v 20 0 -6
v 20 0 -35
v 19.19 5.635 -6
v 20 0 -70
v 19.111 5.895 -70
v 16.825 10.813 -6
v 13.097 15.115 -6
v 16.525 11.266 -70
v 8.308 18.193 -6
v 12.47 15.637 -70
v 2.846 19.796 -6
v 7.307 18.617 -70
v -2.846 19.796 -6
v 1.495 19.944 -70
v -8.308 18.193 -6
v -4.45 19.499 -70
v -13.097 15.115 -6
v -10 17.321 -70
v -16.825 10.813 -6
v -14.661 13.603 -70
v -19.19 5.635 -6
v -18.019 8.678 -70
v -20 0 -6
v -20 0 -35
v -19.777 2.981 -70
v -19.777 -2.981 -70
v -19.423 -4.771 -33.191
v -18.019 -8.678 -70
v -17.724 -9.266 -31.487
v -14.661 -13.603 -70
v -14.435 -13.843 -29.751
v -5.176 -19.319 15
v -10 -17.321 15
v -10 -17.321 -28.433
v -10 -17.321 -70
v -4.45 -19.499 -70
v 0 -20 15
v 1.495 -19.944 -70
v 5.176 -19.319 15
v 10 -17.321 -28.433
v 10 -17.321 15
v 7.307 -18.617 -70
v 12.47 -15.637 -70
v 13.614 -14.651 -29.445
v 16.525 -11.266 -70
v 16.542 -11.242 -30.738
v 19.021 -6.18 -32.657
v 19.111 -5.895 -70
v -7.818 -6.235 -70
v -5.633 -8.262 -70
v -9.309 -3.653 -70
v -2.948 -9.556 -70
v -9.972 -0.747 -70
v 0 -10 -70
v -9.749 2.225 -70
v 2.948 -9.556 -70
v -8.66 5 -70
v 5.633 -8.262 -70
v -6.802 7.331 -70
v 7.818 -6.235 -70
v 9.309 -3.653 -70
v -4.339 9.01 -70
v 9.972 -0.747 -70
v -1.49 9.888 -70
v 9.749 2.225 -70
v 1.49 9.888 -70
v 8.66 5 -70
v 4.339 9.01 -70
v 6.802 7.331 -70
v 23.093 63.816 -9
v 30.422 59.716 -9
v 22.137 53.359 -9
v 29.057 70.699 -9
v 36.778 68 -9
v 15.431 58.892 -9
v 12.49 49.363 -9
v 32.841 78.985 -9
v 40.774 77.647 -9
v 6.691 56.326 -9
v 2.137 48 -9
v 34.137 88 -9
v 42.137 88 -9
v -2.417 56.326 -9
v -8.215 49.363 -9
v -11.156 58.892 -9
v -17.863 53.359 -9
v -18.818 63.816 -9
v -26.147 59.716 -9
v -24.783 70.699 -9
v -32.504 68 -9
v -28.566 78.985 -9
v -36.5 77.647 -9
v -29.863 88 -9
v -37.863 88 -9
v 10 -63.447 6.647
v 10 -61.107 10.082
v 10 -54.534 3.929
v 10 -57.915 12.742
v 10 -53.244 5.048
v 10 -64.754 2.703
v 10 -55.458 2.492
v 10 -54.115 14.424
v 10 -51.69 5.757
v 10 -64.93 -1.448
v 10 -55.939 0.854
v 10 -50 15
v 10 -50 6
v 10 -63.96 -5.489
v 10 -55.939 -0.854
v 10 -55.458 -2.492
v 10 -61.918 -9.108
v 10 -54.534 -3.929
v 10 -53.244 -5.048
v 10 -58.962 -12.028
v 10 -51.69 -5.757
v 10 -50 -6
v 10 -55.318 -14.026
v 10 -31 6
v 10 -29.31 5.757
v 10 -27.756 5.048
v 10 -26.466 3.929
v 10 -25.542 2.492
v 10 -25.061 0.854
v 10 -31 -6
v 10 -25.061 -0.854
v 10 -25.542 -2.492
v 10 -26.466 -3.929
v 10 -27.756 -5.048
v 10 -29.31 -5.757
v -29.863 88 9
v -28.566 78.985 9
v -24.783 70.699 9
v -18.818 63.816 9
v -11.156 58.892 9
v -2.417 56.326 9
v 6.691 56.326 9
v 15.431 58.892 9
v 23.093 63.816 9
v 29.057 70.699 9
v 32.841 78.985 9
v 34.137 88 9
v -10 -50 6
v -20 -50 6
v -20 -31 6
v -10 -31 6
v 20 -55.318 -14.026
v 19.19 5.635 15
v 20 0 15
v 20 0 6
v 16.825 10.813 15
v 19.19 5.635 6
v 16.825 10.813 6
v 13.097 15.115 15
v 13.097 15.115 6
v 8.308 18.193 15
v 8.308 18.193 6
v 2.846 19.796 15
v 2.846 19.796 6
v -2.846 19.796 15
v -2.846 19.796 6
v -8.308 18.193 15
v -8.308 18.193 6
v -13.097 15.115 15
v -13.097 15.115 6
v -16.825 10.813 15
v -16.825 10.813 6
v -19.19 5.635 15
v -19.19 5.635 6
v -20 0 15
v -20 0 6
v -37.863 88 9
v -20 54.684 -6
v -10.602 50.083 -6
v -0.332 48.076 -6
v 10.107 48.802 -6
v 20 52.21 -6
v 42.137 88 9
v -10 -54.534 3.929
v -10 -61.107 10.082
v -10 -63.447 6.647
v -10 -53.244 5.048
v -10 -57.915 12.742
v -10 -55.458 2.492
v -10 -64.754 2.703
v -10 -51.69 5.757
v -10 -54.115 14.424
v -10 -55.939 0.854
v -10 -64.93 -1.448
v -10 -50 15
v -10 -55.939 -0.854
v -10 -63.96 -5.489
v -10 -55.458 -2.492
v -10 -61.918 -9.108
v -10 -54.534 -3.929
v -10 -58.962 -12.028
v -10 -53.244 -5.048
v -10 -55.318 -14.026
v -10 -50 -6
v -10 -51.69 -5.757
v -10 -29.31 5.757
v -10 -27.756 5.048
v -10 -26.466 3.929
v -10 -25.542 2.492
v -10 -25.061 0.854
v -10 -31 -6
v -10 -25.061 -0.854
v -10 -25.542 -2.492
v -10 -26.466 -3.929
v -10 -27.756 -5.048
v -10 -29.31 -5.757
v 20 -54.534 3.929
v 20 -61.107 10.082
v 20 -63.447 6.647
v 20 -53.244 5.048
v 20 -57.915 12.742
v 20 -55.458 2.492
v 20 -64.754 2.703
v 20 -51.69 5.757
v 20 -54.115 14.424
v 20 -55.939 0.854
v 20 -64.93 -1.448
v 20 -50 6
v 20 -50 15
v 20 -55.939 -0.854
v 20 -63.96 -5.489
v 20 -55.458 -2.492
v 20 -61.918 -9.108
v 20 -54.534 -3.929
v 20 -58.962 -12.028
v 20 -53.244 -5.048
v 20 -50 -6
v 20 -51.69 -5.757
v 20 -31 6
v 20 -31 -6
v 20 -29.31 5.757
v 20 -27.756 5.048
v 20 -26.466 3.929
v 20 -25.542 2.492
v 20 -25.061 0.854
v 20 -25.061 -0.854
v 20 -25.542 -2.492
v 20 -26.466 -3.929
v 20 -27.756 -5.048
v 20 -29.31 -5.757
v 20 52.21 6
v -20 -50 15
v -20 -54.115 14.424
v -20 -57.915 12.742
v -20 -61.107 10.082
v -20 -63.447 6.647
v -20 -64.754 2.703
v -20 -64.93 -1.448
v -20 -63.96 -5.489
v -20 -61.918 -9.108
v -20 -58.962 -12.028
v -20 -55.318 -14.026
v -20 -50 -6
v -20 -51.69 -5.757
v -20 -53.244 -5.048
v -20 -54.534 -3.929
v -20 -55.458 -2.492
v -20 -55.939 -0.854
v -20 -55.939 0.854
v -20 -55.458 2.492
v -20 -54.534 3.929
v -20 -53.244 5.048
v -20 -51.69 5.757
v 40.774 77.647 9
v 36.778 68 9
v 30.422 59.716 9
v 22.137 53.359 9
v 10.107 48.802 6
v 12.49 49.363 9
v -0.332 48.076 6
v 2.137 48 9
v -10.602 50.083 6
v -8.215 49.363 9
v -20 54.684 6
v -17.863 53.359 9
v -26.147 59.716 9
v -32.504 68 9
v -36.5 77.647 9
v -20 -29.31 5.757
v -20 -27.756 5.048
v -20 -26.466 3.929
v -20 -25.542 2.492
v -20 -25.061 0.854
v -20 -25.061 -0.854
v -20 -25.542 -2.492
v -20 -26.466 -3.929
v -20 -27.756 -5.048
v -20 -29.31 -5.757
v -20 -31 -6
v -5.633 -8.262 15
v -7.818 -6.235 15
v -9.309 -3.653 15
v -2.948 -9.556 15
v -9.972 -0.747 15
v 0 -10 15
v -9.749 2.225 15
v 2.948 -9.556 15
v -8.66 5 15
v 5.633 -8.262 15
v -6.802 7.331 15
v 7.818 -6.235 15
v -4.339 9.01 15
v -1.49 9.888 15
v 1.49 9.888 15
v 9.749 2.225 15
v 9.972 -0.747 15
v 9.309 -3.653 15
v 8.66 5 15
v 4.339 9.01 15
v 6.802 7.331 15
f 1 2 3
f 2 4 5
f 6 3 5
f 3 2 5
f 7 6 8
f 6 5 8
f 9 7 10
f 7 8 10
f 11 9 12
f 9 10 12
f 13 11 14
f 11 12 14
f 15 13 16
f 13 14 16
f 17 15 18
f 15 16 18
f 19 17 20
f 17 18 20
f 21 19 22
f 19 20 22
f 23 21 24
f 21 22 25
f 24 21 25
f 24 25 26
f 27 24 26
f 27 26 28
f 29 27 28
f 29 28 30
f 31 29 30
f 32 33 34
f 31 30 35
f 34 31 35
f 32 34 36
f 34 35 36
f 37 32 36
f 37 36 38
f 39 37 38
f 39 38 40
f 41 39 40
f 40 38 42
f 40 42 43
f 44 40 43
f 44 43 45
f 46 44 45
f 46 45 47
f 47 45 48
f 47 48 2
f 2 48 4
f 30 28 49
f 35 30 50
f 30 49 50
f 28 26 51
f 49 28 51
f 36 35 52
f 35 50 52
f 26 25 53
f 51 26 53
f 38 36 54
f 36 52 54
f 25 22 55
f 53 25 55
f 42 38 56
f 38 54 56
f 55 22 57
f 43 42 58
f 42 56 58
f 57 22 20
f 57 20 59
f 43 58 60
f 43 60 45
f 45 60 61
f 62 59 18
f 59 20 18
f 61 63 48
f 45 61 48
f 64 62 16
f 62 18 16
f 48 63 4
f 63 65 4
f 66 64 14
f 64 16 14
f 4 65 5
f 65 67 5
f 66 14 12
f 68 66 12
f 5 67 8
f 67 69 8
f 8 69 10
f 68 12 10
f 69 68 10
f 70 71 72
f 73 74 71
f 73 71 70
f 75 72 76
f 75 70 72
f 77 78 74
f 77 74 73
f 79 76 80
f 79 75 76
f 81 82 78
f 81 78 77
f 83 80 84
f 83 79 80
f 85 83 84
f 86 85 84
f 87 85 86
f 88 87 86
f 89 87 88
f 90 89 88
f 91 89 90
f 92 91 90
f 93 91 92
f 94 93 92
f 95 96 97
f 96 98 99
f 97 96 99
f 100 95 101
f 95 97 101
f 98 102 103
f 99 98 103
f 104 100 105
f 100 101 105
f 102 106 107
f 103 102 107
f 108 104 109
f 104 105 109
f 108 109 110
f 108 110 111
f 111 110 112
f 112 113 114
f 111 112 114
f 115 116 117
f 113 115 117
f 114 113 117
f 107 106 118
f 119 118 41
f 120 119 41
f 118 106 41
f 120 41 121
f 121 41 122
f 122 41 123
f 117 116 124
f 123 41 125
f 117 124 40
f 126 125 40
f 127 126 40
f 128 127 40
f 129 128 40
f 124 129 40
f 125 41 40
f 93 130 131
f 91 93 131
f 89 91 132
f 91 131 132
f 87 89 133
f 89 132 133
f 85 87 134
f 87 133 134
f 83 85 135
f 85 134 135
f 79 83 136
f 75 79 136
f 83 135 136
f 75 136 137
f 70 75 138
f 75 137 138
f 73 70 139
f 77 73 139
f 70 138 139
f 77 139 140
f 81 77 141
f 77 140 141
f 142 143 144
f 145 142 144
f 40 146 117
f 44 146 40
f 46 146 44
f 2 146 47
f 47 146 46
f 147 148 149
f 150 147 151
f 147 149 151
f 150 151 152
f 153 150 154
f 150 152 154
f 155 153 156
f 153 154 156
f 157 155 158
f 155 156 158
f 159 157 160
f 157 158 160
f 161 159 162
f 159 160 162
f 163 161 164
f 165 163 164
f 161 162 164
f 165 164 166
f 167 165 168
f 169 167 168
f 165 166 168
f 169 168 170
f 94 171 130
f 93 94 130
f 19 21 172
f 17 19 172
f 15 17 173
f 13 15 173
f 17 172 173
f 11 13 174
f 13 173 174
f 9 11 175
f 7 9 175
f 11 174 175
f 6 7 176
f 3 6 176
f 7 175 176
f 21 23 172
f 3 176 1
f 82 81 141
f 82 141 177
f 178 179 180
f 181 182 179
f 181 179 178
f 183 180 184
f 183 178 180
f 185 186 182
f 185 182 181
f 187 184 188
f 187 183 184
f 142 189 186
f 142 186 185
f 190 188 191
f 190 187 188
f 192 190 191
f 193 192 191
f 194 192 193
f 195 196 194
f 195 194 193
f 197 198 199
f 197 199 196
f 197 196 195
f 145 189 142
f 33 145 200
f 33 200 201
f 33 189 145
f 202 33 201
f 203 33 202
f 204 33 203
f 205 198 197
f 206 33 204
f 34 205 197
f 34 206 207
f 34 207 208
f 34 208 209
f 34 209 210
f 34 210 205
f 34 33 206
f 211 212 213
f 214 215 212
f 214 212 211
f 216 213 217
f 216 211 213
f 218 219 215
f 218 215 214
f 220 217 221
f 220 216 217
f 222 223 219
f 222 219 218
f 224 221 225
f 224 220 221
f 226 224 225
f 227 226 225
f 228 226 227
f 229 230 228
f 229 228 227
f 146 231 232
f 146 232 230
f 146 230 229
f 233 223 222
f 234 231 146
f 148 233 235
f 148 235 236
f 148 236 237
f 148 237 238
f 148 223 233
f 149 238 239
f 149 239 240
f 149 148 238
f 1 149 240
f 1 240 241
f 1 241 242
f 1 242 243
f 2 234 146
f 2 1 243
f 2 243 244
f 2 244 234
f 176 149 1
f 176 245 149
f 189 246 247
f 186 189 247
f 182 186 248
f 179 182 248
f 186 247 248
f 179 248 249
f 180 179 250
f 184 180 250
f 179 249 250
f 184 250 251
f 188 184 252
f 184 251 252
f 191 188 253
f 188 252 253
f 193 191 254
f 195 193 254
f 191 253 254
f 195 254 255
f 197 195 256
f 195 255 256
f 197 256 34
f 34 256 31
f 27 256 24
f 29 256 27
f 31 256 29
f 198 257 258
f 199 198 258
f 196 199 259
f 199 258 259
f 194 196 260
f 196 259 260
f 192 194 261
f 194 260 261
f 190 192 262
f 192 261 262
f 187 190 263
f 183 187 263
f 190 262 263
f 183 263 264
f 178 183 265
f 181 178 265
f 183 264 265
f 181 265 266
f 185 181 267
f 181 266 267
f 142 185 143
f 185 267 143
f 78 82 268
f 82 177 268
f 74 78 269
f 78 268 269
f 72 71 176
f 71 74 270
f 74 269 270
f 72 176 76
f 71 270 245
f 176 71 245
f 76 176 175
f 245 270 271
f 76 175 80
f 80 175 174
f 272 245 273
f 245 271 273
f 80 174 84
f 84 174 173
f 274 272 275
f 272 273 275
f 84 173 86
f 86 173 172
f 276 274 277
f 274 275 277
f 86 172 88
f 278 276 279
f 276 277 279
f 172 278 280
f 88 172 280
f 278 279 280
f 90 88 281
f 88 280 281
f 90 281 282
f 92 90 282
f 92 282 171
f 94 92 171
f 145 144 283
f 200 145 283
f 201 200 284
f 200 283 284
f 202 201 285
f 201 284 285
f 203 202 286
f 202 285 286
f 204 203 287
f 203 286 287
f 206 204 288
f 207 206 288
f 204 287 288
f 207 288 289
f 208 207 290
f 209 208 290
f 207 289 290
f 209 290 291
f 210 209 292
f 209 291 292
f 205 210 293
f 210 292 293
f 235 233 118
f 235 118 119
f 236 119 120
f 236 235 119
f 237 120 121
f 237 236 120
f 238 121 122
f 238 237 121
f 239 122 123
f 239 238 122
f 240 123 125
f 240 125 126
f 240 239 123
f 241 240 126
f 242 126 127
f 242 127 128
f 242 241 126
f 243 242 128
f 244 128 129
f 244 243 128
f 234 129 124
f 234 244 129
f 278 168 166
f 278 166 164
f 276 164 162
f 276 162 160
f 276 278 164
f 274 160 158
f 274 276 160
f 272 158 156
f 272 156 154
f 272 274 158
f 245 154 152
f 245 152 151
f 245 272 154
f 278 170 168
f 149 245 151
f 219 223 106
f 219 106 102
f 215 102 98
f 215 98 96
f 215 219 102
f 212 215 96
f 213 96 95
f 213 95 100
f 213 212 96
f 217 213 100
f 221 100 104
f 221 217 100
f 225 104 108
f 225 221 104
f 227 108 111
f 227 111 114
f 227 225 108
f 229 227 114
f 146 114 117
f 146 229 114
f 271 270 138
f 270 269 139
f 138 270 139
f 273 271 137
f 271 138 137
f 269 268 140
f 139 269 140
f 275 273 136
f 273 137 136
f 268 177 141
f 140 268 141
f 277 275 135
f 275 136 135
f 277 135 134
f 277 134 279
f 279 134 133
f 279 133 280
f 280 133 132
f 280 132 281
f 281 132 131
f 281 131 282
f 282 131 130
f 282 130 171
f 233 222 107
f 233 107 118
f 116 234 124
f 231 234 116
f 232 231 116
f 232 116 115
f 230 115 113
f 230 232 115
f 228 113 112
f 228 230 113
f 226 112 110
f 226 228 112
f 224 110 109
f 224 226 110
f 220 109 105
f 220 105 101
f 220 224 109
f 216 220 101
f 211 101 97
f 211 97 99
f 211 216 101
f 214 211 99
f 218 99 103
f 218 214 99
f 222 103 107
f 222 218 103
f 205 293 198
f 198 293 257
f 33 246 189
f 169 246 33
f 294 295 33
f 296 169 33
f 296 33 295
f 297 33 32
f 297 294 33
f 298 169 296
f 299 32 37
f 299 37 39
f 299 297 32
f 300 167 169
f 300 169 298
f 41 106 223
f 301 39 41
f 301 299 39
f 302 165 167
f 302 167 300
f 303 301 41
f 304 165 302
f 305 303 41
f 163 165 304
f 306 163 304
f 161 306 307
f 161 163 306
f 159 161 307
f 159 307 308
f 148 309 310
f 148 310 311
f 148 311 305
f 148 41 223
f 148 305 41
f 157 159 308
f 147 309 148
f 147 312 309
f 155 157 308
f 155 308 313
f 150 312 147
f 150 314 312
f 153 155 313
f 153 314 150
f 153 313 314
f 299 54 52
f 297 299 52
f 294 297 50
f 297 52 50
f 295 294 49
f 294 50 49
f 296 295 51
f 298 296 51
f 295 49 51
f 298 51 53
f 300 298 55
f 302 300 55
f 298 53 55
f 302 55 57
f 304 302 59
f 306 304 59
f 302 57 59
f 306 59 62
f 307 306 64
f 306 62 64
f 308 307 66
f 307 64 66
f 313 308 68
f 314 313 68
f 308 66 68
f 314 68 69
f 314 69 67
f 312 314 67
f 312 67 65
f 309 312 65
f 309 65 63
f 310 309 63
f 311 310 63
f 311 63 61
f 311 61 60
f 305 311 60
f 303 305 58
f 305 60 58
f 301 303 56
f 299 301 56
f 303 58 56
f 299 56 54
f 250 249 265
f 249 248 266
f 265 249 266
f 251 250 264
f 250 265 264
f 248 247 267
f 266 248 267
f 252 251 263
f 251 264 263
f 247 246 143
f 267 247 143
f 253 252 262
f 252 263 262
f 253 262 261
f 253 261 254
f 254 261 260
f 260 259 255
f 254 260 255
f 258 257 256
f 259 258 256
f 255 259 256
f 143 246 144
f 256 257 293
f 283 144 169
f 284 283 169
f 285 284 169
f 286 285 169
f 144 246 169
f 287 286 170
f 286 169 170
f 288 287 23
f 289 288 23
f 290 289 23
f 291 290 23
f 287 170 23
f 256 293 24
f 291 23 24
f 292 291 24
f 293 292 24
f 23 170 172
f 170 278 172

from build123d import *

# Parameters (mm, degrees)
BOSS_EXTRUDE1_DEPTH      = 9
BOSS_EXTRUDE2_DEPTH      = 6
BOSS_EXTRUDE3_DEPTH      = 15
BOSS_EXTRUDE3_DEPTH_BACK = 70
SKETCH1_4_R              = 20
BOSS_EXTRUDE4_DEPTH      = 10
SKETCH3_W                = 10
SKETCH3_H                = 85.001


with BuildPart() as part:
    # Sketch1 → Boss-Extrude1 (new, symmetric)
    with BuildSketch(Plane.XY):
        with BuildLine():
            ThreePointArc((-29.862613088, 88), (2.137386912, 56), (34.137386912, 88))
            Line((34.137386912, 88), (42.137386912, 88))
            ThreePointArc((42.137386912, 88), (2.137386912, 48), (-37.862613088, 88))
            Line((-37.862613088, 88), (-29.862613088, 88))
        make_face()
    extrude(amount=BOSS_EXTRUDE1_DEPTH, both=True)

    # Sketch1<3> → Boss-Extrude2 (add, symmetric)
    with BuildSketch(Plane.XY):
        with BuildLine():
            ThreePointArc((20, 52.209958736), (-0.332230393, 48.076310411), (-20, 54.684296485))
            Line((-20, 54.684296485), (-20, 0))
            ThreePointArc((-20, 0), (0, 20), (20, 0))
            Line((20, 0), (20, 52.209958736))
        make_face()
    extrude(amount=BOSS_EXTRUDE2_DEPTH, both=True)

    # Sketch1<4> → Boss-Extrude3 (add, two sides: drawn at the far end of the back side and taken through both)
    with BuildSketch(Plane.XY.offset(-BOSS_EXTRUDE3_DEPTH_BACK)):
        Circle(SKETCH1_4_R)
    extrude(amount=BOSS_EXTRUDE3_DEPTH + BOSS_EXTRUDE3_DEPTH_BACK)

    # Sketch2 → Boss-Extrude4 (add)
    with BuildSketch(Plane(origin=(20, 0, 0), x_dir=(0, 0, -1), z_dir=(1, 0, 0))):
        with BuildLine():
            Line((-15, 0), (-15, -50))
            ThreePointArc((-15, -50), (-2.703242507, -64.754405442), (14.025663993, -55.317964795))
            Line((14.025663993, -55.317964795), (35, 0))
            Line((35, 0), (-15, 0))
        make_face()
        with BuildLine():
            Line((-6, -50), (-6, -31))
            ThreePointArc((-6, -31), (0, -25), (6, -31))
            Line((6, -31), (6, -50))
            ThreePointArc((6, -50), (0, -56), (-6, -50))
        make_face(mode=Mode.SUBTRACT)
    boss_extrude4 = extrude(amount=-BOSS_EXTRUDE4_DEPTH)

    # Mirror1: Boss-Extrude4 across plane
    add(boss_extrude4.mirror(Plane(origin=(0, 0, 0), x_dir=(0, 0, 1), z_dir=(1, 0, 0))))

    # Sketch3 → Ø20.0 (20) Diameter Hole1 (revolve, cut)
    with BuildSketch(Plane(origin=(0, 0, 15), x_dir=(0, -1, 0), z_dir=(1, 0, 0))):
        with Locations((5, 42.5005)):
            Rectangle(SKETCH3_W, SKETCH3_H)
    revolve(axis=Axis((0, 0, 21.35), (0, 0, -1)), mode=Mode.SUBTRACT)


solid = part.part
